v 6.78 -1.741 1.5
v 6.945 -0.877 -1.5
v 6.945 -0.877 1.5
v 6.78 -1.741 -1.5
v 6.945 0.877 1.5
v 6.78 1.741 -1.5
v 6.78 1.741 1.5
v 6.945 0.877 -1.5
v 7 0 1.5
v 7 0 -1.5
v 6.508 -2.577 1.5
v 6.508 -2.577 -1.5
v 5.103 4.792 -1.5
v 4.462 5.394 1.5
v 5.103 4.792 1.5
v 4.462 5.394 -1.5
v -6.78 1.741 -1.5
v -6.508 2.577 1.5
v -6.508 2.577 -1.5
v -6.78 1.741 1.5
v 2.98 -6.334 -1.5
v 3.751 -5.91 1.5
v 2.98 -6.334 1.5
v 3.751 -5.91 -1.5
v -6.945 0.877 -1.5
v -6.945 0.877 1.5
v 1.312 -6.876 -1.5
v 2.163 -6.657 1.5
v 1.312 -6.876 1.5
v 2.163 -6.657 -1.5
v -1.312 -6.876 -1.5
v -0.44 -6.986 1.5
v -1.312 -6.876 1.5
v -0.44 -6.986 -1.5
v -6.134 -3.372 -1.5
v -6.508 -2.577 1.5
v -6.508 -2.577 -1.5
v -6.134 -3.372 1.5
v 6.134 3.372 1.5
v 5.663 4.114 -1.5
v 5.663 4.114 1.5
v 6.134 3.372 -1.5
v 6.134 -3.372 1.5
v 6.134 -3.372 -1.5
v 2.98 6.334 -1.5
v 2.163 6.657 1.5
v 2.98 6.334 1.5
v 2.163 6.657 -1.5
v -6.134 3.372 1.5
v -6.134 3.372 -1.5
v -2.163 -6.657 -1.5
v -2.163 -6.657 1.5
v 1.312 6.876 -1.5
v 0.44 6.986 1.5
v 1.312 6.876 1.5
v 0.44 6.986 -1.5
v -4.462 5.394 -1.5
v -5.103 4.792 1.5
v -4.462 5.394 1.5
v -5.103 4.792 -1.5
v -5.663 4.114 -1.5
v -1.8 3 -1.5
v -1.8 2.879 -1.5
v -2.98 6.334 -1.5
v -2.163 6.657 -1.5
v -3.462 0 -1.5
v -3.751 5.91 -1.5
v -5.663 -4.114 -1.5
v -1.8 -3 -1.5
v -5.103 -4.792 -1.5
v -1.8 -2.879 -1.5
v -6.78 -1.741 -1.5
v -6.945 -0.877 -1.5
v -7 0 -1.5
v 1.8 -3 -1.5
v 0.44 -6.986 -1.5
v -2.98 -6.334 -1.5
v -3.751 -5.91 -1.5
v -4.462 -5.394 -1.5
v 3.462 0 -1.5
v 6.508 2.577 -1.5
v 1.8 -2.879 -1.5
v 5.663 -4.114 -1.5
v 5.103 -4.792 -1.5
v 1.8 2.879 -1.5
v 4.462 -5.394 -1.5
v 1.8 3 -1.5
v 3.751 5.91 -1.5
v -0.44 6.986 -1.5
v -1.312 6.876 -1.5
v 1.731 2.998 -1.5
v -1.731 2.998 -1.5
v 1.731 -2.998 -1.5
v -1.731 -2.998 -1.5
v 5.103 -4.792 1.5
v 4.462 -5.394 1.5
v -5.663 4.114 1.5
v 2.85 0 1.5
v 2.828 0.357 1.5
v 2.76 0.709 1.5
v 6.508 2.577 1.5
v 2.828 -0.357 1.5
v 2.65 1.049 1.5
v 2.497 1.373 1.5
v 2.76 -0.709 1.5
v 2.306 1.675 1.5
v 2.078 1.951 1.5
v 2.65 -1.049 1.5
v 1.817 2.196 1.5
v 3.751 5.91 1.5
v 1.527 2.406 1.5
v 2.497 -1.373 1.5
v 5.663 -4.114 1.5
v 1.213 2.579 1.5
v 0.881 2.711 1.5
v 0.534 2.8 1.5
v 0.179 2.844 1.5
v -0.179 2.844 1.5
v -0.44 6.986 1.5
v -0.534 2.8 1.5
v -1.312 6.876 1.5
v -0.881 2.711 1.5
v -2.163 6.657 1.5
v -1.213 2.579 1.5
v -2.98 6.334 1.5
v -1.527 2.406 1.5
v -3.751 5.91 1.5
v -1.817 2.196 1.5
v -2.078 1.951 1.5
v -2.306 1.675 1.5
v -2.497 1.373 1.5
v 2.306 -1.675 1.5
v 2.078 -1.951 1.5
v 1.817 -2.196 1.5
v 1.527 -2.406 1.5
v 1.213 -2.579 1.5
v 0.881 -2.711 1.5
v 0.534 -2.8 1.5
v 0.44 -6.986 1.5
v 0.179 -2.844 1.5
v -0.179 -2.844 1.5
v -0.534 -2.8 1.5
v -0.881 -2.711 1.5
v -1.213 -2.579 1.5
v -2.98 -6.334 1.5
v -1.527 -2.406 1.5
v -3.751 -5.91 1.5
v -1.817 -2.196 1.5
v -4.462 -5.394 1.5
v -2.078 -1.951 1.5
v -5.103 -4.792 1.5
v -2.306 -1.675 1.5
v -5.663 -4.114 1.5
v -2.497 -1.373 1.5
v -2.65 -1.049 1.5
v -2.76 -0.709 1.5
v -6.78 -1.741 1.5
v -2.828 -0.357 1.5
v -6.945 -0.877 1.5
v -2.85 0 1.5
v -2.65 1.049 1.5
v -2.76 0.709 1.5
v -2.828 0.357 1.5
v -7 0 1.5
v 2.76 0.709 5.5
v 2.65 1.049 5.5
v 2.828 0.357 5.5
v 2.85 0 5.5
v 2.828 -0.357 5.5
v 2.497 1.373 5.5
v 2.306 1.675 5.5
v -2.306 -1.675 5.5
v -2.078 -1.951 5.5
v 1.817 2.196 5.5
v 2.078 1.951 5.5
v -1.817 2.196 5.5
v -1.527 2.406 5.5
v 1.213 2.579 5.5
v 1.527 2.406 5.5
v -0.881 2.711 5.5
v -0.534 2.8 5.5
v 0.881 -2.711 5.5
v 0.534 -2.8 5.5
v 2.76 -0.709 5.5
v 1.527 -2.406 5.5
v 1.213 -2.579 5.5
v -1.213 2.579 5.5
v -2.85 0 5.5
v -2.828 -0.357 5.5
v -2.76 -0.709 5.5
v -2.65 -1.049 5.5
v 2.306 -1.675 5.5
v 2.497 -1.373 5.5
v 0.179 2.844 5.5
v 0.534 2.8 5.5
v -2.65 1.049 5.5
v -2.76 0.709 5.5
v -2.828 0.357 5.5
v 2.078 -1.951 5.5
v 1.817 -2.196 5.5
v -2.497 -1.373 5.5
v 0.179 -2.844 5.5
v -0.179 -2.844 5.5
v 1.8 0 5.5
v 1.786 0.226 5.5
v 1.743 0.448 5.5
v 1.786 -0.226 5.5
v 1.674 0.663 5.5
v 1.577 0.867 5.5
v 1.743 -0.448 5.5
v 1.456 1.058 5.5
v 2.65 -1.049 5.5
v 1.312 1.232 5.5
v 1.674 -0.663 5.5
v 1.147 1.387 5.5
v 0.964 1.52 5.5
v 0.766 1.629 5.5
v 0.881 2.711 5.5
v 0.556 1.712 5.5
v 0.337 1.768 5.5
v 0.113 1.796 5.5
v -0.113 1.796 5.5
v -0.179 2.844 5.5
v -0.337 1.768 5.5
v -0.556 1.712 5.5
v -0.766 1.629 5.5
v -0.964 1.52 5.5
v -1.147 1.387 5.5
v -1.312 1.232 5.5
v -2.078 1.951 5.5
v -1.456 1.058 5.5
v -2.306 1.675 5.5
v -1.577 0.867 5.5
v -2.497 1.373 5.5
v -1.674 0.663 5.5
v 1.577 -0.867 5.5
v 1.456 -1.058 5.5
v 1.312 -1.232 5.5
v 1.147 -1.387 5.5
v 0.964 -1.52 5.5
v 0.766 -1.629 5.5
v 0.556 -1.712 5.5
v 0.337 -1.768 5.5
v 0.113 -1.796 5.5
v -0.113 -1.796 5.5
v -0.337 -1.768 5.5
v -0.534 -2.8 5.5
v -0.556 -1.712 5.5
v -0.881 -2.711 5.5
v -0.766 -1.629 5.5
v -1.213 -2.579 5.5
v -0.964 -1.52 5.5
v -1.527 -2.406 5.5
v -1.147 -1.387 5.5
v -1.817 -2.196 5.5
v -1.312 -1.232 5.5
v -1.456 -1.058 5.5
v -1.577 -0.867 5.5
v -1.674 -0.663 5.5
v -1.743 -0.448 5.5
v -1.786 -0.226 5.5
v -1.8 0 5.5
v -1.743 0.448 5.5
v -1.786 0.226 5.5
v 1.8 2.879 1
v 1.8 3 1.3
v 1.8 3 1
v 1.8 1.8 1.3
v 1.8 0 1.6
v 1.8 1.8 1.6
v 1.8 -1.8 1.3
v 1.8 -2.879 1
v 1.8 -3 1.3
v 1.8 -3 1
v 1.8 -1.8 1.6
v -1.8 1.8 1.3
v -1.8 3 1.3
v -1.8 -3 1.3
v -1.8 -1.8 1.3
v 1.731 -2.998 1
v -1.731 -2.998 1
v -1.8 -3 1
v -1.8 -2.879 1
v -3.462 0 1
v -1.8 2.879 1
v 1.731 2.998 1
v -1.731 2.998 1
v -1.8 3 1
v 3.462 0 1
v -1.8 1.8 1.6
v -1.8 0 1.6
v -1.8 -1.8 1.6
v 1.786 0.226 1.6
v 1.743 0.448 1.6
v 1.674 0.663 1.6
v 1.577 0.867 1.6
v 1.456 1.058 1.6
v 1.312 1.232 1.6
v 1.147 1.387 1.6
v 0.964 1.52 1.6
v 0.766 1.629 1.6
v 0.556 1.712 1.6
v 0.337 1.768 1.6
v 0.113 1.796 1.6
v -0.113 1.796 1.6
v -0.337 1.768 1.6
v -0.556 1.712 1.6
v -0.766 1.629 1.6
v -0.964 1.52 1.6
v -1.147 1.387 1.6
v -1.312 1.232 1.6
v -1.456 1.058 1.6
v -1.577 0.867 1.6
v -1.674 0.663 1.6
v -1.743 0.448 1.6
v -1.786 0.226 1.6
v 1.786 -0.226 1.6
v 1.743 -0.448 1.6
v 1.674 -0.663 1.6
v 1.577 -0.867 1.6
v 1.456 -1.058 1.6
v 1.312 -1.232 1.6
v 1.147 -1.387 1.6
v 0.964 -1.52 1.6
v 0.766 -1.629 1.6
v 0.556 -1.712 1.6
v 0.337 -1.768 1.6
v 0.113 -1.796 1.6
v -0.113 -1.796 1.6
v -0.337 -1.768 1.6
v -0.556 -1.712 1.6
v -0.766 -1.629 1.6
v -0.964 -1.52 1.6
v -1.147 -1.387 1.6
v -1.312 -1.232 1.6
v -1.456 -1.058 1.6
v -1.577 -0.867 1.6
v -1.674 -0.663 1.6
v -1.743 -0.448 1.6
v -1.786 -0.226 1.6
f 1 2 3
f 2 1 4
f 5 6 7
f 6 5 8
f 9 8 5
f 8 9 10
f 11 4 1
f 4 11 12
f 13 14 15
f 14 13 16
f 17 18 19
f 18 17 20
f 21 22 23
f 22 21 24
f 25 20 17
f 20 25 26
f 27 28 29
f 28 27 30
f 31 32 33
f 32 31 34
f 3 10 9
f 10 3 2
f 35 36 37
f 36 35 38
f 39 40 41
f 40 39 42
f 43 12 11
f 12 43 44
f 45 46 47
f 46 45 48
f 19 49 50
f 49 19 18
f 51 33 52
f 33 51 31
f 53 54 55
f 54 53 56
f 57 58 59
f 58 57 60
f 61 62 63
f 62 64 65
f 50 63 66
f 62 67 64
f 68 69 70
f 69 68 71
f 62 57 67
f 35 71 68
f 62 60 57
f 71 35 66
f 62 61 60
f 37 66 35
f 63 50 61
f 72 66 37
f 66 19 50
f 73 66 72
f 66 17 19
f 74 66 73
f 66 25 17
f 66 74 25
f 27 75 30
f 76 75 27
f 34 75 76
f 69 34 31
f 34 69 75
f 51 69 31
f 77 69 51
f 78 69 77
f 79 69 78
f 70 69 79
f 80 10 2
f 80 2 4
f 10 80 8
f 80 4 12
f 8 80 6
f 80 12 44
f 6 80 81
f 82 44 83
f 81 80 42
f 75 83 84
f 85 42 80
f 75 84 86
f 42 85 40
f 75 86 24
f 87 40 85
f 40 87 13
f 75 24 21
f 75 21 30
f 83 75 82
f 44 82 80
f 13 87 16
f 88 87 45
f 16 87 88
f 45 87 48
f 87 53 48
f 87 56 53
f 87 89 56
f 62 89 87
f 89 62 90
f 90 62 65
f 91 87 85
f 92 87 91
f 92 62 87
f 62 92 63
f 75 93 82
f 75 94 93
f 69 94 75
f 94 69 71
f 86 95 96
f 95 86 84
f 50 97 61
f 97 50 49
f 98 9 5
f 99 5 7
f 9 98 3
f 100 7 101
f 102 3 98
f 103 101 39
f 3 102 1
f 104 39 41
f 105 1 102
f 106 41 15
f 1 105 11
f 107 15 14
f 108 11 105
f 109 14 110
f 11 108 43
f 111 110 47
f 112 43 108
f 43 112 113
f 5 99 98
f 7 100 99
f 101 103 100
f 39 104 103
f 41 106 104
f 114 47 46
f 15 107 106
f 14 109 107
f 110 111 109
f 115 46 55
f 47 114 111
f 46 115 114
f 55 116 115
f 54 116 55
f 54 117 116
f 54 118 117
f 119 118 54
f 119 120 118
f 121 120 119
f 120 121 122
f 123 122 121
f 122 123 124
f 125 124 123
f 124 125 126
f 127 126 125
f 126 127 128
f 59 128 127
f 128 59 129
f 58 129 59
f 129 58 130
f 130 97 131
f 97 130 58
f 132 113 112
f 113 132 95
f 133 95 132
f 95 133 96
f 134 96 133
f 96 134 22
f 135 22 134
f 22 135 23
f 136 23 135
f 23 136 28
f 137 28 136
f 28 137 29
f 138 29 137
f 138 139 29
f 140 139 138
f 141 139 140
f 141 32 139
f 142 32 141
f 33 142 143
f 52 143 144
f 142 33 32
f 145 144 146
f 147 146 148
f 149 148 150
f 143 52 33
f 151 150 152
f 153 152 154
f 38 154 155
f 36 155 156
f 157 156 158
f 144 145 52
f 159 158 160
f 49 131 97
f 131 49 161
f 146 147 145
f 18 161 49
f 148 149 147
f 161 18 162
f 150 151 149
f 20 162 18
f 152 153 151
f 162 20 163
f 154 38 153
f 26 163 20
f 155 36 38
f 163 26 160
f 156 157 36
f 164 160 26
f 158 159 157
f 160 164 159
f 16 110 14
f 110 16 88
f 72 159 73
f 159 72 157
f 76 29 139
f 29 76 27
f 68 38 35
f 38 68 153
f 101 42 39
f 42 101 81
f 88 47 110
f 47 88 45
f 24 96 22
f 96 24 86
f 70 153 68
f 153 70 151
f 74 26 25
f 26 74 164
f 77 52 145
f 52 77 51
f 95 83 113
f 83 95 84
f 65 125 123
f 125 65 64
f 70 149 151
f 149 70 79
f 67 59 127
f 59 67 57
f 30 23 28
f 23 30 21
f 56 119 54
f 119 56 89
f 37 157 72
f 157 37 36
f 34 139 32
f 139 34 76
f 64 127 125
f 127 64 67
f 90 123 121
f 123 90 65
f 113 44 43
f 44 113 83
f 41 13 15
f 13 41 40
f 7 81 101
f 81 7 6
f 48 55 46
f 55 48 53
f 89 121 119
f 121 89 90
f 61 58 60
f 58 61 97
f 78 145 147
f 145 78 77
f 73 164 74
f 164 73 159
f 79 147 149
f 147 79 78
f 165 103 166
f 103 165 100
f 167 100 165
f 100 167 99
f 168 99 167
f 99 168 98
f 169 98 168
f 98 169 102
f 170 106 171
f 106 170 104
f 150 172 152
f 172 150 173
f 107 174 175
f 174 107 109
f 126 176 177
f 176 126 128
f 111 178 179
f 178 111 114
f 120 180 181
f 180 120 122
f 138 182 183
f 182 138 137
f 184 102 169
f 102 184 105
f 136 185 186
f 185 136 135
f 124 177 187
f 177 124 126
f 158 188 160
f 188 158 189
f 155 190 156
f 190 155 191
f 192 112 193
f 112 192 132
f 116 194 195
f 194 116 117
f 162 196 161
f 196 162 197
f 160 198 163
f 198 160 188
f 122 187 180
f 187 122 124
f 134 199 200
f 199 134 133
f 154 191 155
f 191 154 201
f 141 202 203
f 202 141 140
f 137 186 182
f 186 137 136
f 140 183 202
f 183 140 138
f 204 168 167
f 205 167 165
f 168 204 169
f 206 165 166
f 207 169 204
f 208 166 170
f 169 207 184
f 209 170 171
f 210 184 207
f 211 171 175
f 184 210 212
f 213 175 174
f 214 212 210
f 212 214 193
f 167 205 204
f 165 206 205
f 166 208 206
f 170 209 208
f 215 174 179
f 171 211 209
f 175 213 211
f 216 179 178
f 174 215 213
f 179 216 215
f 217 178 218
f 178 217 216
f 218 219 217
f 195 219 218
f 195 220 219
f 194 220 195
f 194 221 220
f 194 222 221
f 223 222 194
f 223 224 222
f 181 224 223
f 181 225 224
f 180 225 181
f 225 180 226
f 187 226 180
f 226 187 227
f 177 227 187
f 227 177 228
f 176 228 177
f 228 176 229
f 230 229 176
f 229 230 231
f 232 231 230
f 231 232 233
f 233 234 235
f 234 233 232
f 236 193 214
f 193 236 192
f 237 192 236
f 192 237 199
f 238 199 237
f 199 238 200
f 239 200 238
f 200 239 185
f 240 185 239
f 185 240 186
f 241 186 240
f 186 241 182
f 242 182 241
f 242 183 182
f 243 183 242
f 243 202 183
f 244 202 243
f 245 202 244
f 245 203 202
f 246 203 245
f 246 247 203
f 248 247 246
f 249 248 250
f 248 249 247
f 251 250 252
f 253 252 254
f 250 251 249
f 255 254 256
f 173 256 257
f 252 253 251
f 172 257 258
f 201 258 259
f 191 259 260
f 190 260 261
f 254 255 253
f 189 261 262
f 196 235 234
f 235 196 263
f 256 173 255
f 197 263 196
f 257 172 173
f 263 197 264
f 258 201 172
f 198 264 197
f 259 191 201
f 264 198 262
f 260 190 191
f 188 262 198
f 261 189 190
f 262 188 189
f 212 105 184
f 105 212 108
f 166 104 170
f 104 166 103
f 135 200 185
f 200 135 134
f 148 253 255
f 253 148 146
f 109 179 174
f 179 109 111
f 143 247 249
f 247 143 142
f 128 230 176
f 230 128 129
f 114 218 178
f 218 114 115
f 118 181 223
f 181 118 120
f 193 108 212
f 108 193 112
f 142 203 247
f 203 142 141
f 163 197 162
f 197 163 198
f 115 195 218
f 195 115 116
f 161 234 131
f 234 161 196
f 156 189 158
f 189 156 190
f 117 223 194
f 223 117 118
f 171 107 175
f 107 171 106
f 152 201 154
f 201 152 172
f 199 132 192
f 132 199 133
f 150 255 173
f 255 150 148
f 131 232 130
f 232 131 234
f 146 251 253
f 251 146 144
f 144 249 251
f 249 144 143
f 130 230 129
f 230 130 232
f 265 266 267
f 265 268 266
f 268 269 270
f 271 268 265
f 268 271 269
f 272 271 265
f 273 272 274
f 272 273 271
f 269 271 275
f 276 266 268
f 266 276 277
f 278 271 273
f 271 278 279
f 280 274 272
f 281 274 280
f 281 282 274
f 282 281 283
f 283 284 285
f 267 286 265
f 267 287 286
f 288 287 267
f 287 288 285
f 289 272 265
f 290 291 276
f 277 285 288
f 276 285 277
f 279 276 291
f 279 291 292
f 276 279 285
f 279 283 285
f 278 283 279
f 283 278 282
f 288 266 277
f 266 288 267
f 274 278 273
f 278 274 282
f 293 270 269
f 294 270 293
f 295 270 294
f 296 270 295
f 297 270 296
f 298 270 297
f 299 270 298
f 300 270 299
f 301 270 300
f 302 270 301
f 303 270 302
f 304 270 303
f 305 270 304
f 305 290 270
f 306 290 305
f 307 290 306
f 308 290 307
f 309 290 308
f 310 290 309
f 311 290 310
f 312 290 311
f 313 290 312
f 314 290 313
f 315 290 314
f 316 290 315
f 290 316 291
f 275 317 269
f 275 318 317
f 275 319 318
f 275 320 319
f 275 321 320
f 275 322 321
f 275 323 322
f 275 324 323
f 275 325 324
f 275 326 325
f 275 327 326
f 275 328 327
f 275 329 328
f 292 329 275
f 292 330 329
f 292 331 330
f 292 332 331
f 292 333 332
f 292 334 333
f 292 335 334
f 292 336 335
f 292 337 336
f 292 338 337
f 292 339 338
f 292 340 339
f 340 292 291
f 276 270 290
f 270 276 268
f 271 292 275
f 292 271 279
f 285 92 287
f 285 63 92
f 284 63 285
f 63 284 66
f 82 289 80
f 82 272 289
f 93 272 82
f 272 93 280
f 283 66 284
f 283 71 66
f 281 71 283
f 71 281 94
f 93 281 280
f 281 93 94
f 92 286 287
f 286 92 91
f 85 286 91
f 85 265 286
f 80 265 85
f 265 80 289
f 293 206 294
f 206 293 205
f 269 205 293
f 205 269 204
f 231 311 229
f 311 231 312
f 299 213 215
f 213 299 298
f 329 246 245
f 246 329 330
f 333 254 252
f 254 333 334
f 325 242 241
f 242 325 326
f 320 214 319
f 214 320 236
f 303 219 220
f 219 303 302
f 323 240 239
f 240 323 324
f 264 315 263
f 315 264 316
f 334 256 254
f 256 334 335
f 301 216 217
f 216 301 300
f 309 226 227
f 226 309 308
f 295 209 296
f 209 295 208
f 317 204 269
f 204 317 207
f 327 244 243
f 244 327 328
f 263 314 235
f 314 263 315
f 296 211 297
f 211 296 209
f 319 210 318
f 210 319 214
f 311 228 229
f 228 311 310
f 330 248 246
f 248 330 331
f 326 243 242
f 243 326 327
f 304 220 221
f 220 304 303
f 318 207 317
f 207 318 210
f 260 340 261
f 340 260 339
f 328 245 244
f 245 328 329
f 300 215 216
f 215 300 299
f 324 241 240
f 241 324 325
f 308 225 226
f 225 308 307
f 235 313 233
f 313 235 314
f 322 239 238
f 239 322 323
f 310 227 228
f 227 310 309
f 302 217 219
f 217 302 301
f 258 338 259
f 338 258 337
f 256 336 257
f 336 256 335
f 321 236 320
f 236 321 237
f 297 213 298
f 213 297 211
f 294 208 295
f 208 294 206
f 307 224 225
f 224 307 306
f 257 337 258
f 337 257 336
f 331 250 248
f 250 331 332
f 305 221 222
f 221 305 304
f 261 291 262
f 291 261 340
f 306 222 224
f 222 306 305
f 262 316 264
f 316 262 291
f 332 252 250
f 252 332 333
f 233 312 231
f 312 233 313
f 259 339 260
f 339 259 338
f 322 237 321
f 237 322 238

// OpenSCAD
$fn = 50;


difference() {
	union() {
		translate(v = [0, 0, -1.5000000000]) {
			cylinder(h = 3, r = 7.0000000000);
		}
		translate(v = [0, 0, -1.5000000000]) {
			cylinder(h = 7, r = 2.8500000000);
		}
	}
	union() {
		translate(v = [0, 0, -1.5000000000]) {
			rotate(a = [0, 0, 0]) {
				difference() {
					union() {
						translate(v = [-1.8000000000, -3.0000000000, -0.3000000000]) {
							cube(size = [3.6000000000, 6.0000000000, 0.3000000000]);
						}
						translate(v = [-1.8000000000, -1.8000000000, -0.6000000000]) {
							cube(size = [3.6000000000, 3.6000000000, 0.3000000000]);
						}
						translate(v = [-1.8000000000, -3.0000000000, 2.5000000000]) {
							cube(size = [3.6000000000, 6.0000000000, 0.3000000000]);
						}
						translate(v = [-1.8000000000, -1.8000000000, 2.8000000000]) {
							cube(size = [3.6000000000, 3.6000000000, 0.3000000000]);
						}
						linear_extrude(height = 2.5000000000) {
							polygon(points = [[3.4620000000, 0.0000000000], [1.7310000000, 2.9981799479], [-1.7310000000, 2.9981799479], [-3.4620000000, 0.0000000000], [-1.7310000000, -2.9981799479], [1.7310000000, -2.9981799479]]);
						}
						translate(v = [-1.8000000000, -3.0000000000, -0.3000000000]) {
							cube(size = [3.6000000000, 6.0000000000, 0.3000000000]);
						}
						translate(v = [-1.8000000000, -1.8000000000, -0.6000000000]) {
							cube(size = [3.6000000000, 3.6000000000, 0.3000000000]);
						}
						translate(v = [-1.8000000000, -3.0000000000, 2.5000000000]) {
							cube(size = [3.6000000000, 6.0000000000, 0.3000000000]);
						}
						translate(v = [-1.8000000000, -1.8000000000, 2.8000000000]) {
							cube(size = [3.6000000000, 3.6000000000, 0.3000000000]);
						}
						translate(v = [-1.8000000000, -3.0000000000, -0.3000000000]) {
							cube(size = [3.6000000000, 6.0000000000, 0.3000000000]);
						}
						translate(v = [-1.8000000000, -1.8000000000, -0.6000000000]) {
							cube(size = [3.6000000000, 3.6000000000, 0.3000000000]);
						}
						translate(v = [-1.8000000000, -3.0000000000, 2.5000000000]) {
							cube(size = [3.6000000000, 6.0000000000, 0.3000000000]);
						}
						translate(v = [-1.8000000000, -1.8000000000, 2.8000000000]) {
							cube(size = [3.6000000000, 3.6000000000, 0.3000000000]);
						}
					}
					union();
				}
			}
		}
		translate(v = [0, 0, -50.0000000000]) {
			cylinder(h = 100, r = 1.8000000000);
		}
	}
}
